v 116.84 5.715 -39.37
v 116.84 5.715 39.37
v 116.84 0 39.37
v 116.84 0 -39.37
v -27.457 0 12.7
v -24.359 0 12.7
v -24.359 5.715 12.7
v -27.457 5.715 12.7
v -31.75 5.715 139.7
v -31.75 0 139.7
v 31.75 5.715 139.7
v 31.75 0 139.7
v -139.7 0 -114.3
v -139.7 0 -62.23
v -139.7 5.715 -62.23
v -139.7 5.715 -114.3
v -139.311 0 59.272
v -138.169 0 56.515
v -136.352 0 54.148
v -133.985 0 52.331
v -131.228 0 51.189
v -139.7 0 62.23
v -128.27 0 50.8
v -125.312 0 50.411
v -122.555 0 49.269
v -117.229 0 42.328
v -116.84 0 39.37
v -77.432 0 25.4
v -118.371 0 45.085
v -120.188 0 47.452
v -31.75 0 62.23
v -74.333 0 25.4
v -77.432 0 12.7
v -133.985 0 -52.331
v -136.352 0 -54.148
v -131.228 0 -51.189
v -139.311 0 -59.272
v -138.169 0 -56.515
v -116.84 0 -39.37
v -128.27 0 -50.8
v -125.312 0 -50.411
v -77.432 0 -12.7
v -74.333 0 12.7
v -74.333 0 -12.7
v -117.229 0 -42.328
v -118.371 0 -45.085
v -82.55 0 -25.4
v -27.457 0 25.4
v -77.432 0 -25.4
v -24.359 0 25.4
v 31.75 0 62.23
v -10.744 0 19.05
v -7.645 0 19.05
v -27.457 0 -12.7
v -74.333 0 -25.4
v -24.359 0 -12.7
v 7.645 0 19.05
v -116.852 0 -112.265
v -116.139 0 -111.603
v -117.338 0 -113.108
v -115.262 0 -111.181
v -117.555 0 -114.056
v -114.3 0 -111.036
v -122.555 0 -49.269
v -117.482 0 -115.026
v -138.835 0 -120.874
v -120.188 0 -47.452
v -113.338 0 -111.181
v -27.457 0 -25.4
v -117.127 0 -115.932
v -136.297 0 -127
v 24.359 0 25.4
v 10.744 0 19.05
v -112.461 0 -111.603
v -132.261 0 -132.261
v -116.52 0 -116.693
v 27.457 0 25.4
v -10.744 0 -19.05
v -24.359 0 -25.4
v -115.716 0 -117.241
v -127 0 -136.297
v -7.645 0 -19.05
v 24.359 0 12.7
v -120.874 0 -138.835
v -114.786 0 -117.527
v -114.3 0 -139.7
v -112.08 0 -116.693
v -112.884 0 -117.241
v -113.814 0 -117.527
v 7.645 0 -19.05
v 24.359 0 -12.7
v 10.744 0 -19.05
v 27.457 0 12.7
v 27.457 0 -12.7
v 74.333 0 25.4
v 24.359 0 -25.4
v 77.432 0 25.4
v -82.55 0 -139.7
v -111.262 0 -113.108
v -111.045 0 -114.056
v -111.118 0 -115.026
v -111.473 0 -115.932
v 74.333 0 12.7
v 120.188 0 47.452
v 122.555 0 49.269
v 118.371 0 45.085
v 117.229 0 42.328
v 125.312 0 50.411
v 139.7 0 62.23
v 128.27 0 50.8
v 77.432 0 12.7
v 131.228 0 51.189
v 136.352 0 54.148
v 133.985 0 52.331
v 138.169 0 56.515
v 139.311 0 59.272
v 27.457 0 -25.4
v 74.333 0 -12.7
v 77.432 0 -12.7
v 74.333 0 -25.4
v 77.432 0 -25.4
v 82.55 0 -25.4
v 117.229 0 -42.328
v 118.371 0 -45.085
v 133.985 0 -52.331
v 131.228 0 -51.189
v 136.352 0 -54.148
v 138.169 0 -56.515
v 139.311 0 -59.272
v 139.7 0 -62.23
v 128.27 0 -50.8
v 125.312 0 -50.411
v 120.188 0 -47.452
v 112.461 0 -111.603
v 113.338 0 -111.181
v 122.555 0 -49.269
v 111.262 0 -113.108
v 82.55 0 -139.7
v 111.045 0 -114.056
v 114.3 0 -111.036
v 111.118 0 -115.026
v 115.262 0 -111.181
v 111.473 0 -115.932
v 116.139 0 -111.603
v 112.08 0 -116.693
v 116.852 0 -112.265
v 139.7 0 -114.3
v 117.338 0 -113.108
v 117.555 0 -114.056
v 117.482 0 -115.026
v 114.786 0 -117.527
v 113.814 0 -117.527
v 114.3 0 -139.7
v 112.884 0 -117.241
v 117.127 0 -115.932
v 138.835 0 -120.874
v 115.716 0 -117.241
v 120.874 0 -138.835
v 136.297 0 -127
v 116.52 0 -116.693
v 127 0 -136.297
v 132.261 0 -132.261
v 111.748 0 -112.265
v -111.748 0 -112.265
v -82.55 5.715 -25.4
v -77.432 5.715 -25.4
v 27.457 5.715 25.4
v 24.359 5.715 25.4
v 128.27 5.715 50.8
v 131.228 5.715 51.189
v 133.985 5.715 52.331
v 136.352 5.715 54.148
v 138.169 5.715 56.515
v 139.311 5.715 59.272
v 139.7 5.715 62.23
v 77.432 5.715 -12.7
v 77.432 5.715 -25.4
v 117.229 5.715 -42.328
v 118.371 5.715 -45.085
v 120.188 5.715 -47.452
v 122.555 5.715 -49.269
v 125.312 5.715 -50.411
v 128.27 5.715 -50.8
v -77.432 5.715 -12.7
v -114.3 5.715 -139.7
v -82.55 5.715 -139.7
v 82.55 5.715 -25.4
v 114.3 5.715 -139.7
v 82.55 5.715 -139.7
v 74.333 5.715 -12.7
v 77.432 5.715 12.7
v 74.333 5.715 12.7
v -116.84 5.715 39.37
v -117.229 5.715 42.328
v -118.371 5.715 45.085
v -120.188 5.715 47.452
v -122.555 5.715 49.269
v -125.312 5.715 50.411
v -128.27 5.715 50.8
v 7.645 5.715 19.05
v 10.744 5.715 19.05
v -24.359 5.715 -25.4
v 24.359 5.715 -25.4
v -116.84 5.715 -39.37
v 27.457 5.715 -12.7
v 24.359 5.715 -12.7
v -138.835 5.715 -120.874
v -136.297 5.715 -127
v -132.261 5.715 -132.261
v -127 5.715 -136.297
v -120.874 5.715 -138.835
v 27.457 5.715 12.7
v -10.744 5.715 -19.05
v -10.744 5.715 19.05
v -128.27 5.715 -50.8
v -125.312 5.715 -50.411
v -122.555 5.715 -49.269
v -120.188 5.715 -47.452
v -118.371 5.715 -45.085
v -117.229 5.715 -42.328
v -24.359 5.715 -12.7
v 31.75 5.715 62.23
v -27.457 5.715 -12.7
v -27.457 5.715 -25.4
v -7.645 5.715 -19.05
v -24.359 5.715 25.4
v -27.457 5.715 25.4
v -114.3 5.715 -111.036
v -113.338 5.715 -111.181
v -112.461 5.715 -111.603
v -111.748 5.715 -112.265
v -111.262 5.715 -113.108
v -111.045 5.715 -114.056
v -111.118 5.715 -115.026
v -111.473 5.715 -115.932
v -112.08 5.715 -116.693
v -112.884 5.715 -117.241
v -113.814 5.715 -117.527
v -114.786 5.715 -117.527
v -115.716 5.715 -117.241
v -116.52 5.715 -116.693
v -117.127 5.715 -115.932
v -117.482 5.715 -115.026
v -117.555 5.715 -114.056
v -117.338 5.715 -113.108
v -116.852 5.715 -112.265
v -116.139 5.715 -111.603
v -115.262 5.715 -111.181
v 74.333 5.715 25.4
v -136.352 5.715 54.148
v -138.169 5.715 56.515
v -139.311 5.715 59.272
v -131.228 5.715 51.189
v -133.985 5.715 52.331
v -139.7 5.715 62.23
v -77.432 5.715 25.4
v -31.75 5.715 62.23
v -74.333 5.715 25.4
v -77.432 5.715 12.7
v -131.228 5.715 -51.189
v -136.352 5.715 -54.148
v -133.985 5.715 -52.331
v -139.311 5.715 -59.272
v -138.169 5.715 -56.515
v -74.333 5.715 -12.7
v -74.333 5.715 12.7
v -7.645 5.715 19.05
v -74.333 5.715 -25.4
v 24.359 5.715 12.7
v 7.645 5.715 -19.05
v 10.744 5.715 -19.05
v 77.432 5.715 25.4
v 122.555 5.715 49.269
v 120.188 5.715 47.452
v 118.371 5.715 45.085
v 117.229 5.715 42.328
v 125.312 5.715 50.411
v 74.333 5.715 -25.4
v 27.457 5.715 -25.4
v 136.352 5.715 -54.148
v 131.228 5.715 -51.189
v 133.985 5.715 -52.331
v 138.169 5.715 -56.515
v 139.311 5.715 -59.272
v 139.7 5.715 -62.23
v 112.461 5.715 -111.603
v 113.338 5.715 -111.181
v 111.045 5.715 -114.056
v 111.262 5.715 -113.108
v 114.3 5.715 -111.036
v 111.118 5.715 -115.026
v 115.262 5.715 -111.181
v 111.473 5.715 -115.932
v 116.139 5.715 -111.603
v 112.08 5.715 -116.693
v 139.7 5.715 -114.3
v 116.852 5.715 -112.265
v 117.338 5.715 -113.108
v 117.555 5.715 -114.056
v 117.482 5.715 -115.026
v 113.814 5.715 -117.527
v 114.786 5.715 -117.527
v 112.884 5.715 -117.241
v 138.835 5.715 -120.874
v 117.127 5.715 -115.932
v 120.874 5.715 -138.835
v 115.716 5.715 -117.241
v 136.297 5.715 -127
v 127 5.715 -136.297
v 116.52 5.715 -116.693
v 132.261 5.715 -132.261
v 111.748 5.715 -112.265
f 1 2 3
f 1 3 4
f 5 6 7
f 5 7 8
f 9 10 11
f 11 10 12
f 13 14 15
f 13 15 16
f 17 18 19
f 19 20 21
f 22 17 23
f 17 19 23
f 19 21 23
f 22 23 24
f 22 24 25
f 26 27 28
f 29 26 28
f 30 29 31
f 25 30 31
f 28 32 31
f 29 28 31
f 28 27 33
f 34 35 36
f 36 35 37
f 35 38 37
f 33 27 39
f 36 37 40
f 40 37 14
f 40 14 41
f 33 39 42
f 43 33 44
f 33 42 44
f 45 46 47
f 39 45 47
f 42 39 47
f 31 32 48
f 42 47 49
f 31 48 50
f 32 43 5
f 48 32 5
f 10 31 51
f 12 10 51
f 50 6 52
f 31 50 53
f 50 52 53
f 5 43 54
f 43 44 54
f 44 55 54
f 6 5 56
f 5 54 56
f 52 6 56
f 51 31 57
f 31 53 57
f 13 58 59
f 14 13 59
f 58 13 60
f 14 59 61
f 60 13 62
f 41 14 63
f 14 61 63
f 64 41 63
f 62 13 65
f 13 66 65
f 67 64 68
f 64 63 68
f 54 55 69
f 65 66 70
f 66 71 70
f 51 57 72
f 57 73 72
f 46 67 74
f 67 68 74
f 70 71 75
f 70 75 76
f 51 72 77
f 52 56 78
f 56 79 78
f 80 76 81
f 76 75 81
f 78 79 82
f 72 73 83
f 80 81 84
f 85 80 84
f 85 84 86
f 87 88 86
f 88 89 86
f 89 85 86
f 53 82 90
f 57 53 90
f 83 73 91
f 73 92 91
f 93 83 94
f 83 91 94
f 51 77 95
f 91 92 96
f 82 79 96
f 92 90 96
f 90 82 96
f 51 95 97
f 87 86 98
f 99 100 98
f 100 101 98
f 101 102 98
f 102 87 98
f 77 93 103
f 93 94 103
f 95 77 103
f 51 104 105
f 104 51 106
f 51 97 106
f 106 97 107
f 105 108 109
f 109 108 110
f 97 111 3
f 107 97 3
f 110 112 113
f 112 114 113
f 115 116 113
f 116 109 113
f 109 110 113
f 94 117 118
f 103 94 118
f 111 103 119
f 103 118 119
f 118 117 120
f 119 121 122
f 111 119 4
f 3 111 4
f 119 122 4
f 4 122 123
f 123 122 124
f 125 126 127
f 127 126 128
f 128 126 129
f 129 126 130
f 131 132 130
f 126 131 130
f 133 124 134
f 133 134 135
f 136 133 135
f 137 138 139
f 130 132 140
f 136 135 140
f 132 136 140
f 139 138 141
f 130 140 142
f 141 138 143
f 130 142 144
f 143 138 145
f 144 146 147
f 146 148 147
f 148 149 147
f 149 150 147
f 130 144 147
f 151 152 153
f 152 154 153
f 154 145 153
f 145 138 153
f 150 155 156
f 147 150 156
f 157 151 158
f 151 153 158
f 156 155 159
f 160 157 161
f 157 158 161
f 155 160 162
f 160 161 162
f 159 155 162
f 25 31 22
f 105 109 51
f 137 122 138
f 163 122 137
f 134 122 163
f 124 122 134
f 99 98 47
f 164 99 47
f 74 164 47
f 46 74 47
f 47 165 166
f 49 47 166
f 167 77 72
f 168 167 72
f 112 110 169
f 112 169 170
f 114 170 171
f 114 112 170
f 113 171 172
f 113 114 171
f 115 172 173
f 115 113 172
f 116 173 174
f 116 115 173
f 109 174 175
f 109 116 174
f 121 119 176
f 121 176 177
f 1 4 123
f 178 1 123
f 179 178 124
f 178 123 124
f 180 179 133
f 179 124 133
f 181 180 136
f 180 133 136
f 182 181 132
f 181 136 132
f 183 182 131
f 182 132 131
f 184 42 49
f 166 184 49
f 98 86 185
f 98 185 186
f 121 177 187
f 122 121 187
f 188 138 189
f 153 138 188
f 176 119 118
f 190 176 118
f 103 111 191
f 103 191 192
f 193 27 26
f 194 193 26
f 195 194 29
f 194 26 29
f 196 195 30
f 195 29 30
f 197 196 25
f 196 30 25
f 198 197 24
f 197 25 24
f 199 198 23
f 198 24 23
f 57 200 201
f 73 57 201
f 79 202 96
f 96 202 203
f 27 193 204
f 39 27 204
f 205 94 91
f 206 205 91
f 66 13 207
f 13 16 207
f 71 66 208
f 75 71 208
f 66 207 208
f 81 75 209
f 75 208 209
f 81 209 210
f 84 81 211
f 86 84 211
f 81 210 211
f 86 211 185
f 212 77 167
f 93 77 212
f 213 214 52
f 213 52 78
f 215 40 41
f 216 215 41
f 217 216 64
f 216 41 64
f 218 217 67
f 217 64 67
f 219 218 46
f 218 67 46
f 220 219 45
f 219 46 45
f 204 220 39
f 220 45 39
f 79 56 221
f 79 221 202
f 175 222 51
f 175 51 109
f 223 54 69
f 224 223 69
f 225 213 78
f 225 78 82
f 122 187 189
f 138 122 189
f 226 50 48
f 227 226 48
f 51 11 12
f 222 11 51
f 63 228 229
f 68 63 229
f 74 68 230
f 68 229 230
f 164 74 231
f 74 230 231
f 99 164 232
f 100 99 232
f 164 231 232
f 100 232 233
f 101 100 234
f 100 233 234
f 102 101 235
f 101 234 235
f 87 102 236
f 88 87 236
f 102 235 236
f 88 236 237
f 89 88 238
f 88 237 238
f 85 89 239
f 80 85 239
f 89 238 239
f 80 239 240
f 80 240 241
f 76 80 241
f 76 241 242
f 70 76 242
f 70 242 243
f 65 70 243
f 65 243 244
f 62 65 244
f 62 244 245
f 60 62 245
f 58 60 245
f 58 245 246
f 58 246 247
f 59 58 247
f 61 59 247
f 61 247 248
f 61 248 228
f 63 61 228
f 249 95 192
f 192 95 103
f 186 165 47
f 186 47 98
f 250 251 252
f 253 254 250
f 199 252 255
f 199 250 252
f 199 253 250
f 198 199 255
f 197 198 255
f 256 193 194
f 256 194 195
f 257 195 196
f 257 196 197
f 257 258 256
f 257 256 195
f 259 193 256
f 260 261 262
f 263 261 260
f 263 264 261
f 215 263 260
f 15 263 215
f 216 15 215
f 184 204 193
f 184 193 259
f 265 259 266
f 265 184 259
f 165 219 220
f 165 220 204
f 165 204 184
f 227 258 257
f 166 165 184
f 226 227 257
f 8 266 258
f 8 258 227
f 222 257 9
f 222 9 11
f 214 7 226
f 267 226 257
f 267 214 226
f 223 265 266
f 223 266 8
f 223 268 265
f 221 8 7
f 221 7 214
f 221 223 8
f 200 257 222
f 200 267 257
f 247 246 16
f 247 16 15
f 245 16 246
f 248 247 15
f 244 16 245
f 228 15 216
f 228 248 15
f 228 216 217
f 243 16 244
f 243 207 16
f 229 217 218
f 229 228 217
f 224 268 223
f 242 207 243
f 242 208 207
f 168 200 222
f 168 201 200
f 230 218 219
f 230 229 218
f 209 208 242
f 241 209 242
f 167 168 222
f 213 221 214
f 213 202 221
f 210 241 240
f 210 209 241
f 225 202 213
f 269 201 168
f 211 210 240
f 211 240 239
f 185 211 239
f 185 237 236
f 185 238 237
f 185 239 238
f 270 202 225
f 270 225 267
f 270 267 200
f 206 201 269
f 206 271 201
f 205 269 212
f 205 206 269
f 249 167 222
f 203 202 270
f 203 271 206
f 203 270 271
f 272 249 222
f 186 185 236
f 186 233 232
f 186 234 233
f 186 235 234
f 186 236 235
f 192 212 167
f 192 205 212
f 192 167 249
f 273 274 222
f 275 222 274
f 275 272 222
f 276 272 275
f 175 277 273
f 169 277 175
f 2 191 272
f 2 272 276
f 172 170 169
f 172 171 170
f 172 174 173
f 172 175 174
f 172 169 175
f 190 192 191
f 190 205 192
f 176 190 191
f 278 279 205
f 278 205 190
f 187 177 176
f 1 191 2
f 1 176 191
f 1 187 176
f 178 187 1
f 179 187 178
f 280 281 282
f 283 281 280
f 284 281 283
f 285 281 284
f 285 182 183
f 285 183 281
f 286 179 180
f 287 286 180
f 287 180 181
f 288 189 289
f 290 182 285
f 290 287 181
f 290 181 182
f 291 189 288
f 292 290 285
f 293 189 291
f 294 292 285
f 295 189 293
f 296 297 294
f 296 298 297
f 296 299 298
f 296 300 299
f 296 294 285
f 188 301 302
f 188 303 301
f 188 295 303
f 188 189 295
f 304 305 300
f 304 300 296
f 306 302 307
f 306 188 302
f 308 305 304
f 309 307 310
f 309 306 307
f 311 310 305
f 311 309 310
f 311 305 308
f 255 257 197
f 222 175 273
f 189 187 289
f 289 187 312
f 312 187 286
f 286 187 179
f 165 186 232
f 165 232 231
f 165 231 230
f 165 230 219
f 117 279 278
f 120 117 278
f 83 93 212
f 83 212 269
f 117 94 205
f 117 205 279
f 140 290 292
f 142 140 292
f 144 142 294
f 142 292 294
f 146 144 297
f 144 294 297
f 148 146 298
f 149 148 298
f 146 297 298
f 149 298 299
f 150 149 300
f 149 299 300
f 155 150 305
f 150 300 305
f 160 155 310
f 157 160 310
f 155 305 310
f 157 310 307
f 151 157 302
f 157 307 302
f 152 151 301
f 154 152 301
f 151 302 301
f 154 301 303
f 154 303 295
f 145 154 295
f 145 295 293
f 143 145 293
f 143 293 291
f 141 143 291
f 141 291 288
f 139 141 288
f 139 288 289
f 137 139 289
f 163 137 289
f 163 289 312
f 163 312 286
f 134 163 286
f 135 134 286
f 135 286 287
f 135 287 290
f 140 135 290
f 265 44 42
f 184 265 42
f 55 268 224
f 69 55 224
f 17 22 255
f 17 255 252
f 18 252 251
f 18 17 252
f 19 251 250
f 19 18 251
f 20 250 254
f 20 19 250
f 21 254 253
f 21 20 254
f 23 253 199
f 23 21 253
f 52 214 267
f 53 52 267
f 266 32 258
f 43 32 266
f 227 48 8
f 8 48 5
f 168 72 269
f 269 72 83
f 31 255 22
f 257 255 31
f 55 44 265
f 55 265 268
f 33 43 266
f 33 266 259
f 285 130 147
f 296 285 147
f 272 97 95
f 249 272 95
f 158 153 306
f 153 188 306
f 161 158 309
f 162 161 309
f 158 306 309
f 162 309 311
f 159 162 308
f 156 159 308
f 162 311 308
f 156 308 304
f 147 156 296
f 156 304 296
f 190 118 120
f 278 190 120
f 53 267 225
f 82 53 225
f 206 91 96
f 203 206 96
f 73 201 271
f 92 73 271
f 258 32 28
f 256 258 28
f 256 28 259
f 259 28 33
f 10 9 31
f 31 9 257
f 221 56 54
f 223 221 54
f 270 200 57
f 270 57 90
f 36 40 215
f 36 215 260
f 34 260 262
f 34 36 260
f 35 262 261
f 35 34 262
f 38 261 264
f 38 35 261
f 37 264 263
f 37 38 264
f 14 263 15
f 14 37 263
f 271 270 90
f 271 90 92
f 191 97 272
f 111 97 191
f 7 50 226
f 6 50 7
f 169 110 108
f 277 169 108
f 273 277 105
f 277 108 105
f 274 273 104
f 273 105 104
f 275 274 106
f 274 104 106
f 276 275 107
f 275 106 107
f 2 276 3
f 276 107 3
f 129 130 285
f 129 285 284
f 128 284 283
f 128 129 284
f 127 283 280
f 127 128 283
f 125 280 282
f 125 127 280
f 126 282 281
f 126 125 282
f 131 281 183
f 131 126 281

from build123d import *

# Parameters (mm, degrees)
SKETCH1_W           = 279.4
SKETCH1_H           = 279.4
BOSS_EXTRUDE1_DEPTH = 5.715
CUT_EXTRUDE2_REACH  = 199.648
SKETCH4_W           = 22.86
SKETCH4_H           = 101.6
FILLET1_START       = -1
FILLET1_DEPTH       = 8
FILLET1_2_DEPTH     = 5.715
CUT_EXTRUDE3_REACH  = 199.648
SKETCH5_W           = 3.0988
SKETCH5_H           = 12.7
CUT_EXTRUDE4_REACH  = 199.648
SKETCH6_R           = 3.2639
FILLET2_R           = 25.4
CUT_EXTRUDE5_REACH  = 199.648
SKETCH7_W           = 165.1
SKETCH7_H           = 114.3
CUT_EXTRUDE7_REACH  = 199.648
SKETCH16_W          = 3.0988
SKETCH16_H          = 38.1
CUT_EXTRUDE11_REACH = 199.648
SKETCH26_W          = 107.95
SKETCH26_H          = 77.47


with BuildPart() as part:
    # Sketch1 → Boss-Extrude1 (new body)
    with BuildSketch(Plane(origin=(0, 0, 0), x_dir=(1, 0, 0), z_dir=(0, 1, 0))):
        Rectangle(SKETCH1_W, SKETCH1_H)
    extrude(amount=BOSS_EXTRUDE1_DEPTH)

    # Sketch4 → Cut-Extrude2 (cut, up to next)
    with BuildSketch(Plane(origin=(0, 5.715, 0), x_dir=(1, 0, 0), z_dir=(0, 1, 0)), mode=Mode.PRIVATE) as cut_extrude2_sk1:
        with Locations((-128.27, 0)):
            Rectangle(SKETCH4_W, SKETCH4_H)
    cut_extrude2_tool1 = extrude(cut_extrude2_sk1.sketch, amount=-CUT_EXTRUDE2_REACH, mode=Mode.PRIVATE) & part.part
    # Sketch4 → Cut-Extrude2 (cut, up to next)
    with BuildSketch(Plane(origin=(0, 5.715, 0), x_dir=(1, 0, 0), z_dir=(0, 1, 0)), mode=Mode.PRIVATE) as cut_extrude2_sk2:
        with Locations((128.27, 0)):
            Rectangle(SKETCH4_W, SKETCH4_H)
    cut_extrude2_tool2 = extrude(cut_extrude2_sk2.sketch, amount=-CUT_EXTRUDE2_REACH, mode=Mode.PRIVATE) & part.part
    add(cut_extrude2_tool1.solids().sort_by_distance((-128.27, 5.715, 0))[0], mode=Mode.SUBTRACT)
    add(cut_extrude2_tool2.solids().sort_by_distance((128.27, 5.715, 0))[0], mode=Mode.SUBTRACT)

    # Fillet1: read off the stored shape, not the designer's step
    # Fillet1 outline → Fillet1 (cut)
    with BuildSketch(Plane(origin=(0, 0, 0), x_dir=(1, 0, 0), z_dir=(0, 1, 0)).offset(FILLET1_START)):
        with BuildLine():
            ThreePointArc((-139.7, -62.23), (-136.352230509, -54.147769491), (-128.27, -50.8))
            Line((-128.27, -50.8), (-139.7, -50.8))
            Line((-139.7, -50.8), (-139.7, -62.23))
        make_face()
        with BuildLine():
            ThreePointArc((-128.27, 50.8), (-136.352230509, 54.147769491), (-139.7, 62.23))
            Line((-139.7, 62.23), (-139.7, 50.8))
            Line((-139.7, 50.8), (-128.27, 50.8))
        make_face()
        with BuildLine():
            Line((139.7, -50.8), (128.27, -50.8))
            ThreePointArc((128.27, -50.8), (136.352230509, -54.147769491), (139.7, -62.23))
            Line((139.7, -62.23), (139.7, -50.8))
        make_face()
        with BuildLine():
            ThreePointArc((139.7, 62.23), (136.352230509, 54.147769491), (128.27, 50.8))
            Line((128.27, 50.8), (139.7, 50.8))
            Line((139.7, 50.8), (139.7, 62.23))
        make_face()
    extrude(amount=FILLET1_DEPTH, mode=Mode.SUBTRACT)

    # Fillet1 2 outline → Fillet1 2 (add)
    with BuildSketch(Plane(origin=(0, 0, 0), x_dir=(1, 0, 0), z_dir=(0, 1, 0))):
        with BuildLine():
            Line((-116.84, -50.8), (-116.84, -39.37))
            ThreePointArc((-116.84, -39.37), (-120.187769491, -47.452230509), (-128.27, -50.8))
            Line((-128.27, -50.8), (-116.84, -50.8))
        make_face()
        with BuildLine():
            Line((-116.84, 50.8), (-128.27, 50.8))
            ThreePointArc((-128.27, 50.8), (-120.187769491, 47.452230509), (-116.84, 39.37))
            Line((-116.84, 39.37), (-116.84, 50.8))
        make_face()
        with BuildLine():
            Line((116.84, -50.8), (128.27, -50.8))
            ThreePointArc((128.27, -50.8), (120.187769491, -47.452230509), (116.84, -39.37))
            Line((116.84, -39.37), (116.84, -50.8))
        make_face()
        with BuildLine():
            Line((116.84, 50.8), (116.84, 39.37))
            ThreePointArc((116.84, 39.37), (120.187769491, 47.452230509), (128.27, 50.8))
            Line((128.27, 50.8), (116.84, 50.8))
        make_face()
    extrude(amount=FILLET1_2_DEPTH)

    # Sketch5 → Cut-Extrude3 (cut, up to next)
    with BuildSketch(Plane(origin=(0, 0, 0), x_dir=(-1, 0, 0), z_dir=(0, -1, 0)), mode=Mode.PRIVATE) as cut_extrude3_sk1:
        with Locations((75.8825, -19.05)):
            Rectangle(SKETCH5_W, SKETCH5_H)
    cut_extrude3_tool1 = extrude(cut_extrude3_sk1.sketch, amount=-CUT_EXTRUDE3_REACH, mode=Mode.PRIVATE) & part.part
    # Sketch5 → Cut-Extrude3 (cut, up to next)
    with BuildSketch(Plane(origin=(0, 0, 0), x_dir=(-1, 0, 0), z_dir=(0, -1, 0)), mode=Mode.PRIVATE) as cut_extrude3_sk2:
        with Locations((75.8825, 19.05)):
            Rectangle(SKETCH5_W, SKETCH5_H)
    cut_extrude3_tool2 = extrude(cut_extrude3_sk2.sketch, amount=-CUT_EXTRUDE3_REACH, mode=Mode.PRIVATE) & part.part
    # Sketch5 → Cut-Extrude3 (cut, up to next)
    with BuildSketch(Plane(origin=(0, 0, 0), x_dir=(-1, 0, 0), z_dir=(0, -1, 0)), mode=Mode.PRIVATE) as cut_extrude3_sk3:
        with Locations((-75.8825, 19.05)):
            Rectangle(SKETCH5_W, SKETCH5_H)
    cut_extrude3_tool3 = extrude(cut_extrude3_sk3.sketch, amount=-CUT_EXTRUDE3_REACH, mode=Mode.PRIVATE) & part.part
    # Sketch5 → Cut-Extrude3 (cut, up to next)
    with BuildSketch(Plane(origin=(0, 0, 0), x_dir=(-1, 0, 0), z_dir=(0, -1, 0)), mode=Mode.PRIVATE) as cut_extrude3_sk4:
        with Locations((-75.8825, -19.05)):
            Rectangle(SKETCH5_W, SKETCH5_H)
    cut_extrude3_tool4 = extrude(cut_extrude3_sk4.sketch, amount=-CUT_EXTRUDE3_REACH, mode=Mode.PRIVATE) & part.part
    # Sketch5 → Cut-Extrude3 (cut, up to next)
    with BuildSketch(Plane(origin=(0, 0, 0), x_dir=(-1, 0, 0), z_dir=(0, -1, 0)), mode=Mode.PRIVATE) as cut_extrude3_sk5:
        with Locations((25.908, -19.05)):
            Rectangle(SKETCH5_W, SKETCH5_H)
    cut_extrude3_tool5 = extrude(cut_extrude3_sk5.sketch, amount=-CUT_EXTRUDE3_REACH, mode=Mode.PRIVATE) & part.part
    # Sketch5 → Cut-Extrude3 (cut, up to next)
    with BuildSketch(Plane(origin=(0, 0, 0), x_dir=(-1, 0, 0), z_dir=(0, -1, 0)), mode=Mode.PRIVATE) as cut_extrude3_sk6:
        with Locations((25.908, 19.05)):
            Rectangle(SKETCH5_W, SKETCH5_H)
    cut_extrude3_tool6 = extrude(cut_extrude3_sk6.sketch, amount=-CUT_EXTRUDE3_REACH, mode=Mode.PRIVATE) & part.part
    # Sketch5 → Cut-Extrude3 (cut, up to next)
    with BuildSketch(Plane(origin=(0, 0, 0), x_dir=(-1, 0, 0), z_dir=(0, -1, 0)), mode=Mode.PRIVATE) as cut_extrude3_sk7:
        with Locations((-25.908, 19.05)):
            Rectangle(SKETCH5_W, SKETCH5_H)
    cut_extrude3_tool7 = extrude(cut_extrude3_sk7.sketch, amount=-CUT_EXTRUDE3_REACH, mode=Mode.PRIVATE) & part.part
    # Sketch5 → Cut-Extrude3 (cut, up to next)
    with BuildSketch(Plane(origin=(0, 0, 0), x_dir=(-1, 0, 0), z_dir=(0, -1, 0)), mode=Mode.PRIVATE) as cut_extrude3_sk8:
        with Locations((-25.908, -19.05)):
            Rectangle(SKETCH5_W, SKETCH5_H)
    cut_extrude3_tool8 = extrude(cut_extrude3_sk8.sketch, amount=-CUT_EXTRUDE3_REACH, mode=Mode.PRIVATE) & part.part
    add(cut_extrude3_tool1.solids().sort_by_distance((-75.8825, 0, 19.05))[0], mode=Mode.SUBTRACT)
    add(cut_extrude3_tool2.solids().sort_by_distance((-75.8825, 0, -19.05))[0], mode=Mode.SUBTRACT)
    add(cut_extrude3_tool3.solids().sort_by_distance((75.8825, 0, -19.05))[0], mode=Mode.SUBTRACT)
    add(cut_extrude3_tool4.solids().sort_by_distance((75.8825, 0, 19.05))[0], mode=Mode.SUBTRACT)
    add(cut_extrude3_tool5.solids().sort_by_distance((-25.908, 0, 19.05))[0], mode=Mode.SUBTRACT)
    add(cut_extrude3_tool6.solids().sort_by_distance((-25.908, 0, -19.05))[0], mode=Mode.SUBTRACT)
    add(cut_extrude3_tool7.solids().sort_by_distance((25.908, 0, -19.05))[0], mode=Mode.SUBTRACT)
    add(cut_extrude3_tool8.solids().sort_by_distance((25.908, 0, 19.05))[0], mode=Mode.SUBTRACT)

    # Sketch6 → Cut-Extrude4 (cut, up to next)
    with BuildSketch(Plane(origin=(0, 5.715, 0), x_dir=(1, 0, 0), z_dir=(0, 1, 0)), mode=Mode.PRIVATE) as cut_extrude4_sk1:
        with Locations(Location((-114.3, 114.3, 0), (0, 0, 270))):
            Circle(SKETCH6_R)
    cut_extrude4_tool1 = extrude(cut_extrude4_sk1.sketch, amount=-CUT_EXTRUDE4_REACH, mode=Mode.PRIVATE) & part.part
    # Sketch6 → Cut-Extrude4 (cut, up to next)
    with BuildSketch(Plane(origin=(0, 5.715, 0), x_dir=(1, 0, 0), z_dir=(0, 1, 0)), mode=Mode.PRIVATE) as cut_extrude4_sk2:
        with Locations(Location((114.3, 114.3, 0), (0, 0, 270))):
            Circle(SKETCH6_R)
    cut_extrude4_tool2 = extrude(cut_extrude4_sk2.sketch, amount=-CUT_EXTRUDE4_REACH, mode=Mode.PRIVATE) & part.part
    # Sketch6 → Cut-Extrude4 (cut, up to next)
    with BuildSketch(Plane(origin=(0, 5.715, 0), x_dir=(1, 0, 0), z_dir=(0, 1, 0)), mode=Mode.PRIVATE) as cut_extrude4_sk3:
        with Locations(Location((114.3, -114.3, 0), (0, 0, 270))):
            Circle(SKETCH6_R)
    cut_extrude4_tool3 = extrude(cut_extrude4_sk3.sketch, amount=-CUT_EXTRUDE4_REACH, mode=Mode.PRIVATE) & part.part
    # Sketch6 → Cut-Extrude4 (cut, up to next)
    with BuildSketch(Plane(origin=(0, 5.715, 0), x_dir=(1, 0, 0), z_dir=(0, 1, 0)), mode=Mode.PRIVATE) as cut_extrude4_sk4:
        with Locations(Location((-114.3, -114.3, 0), (0, 0, 270))):
            Circle(SKETCH6_R)
    cut_extrude4_tool4 = extrude(cut_extrude4_sk4.sketch, amount=-CUT_EXTRUDE4_REACH, mode=Mode.PRIVATE) & part.part
    add(cut_extrude4_tool1.solids().sort_by_distance((-114.3, 5.715, -114.3))[0], mode=Mode.SUBTRACT)
    add(cut_extrude4_tool2.solids().sort_by_distance((114.3, 5.715, -114.3))[0], mode=Mode.SUBTRACT)
    add(cut_extrude4_tool3.solids().sort_by_distance((114.3, 5.715, 114.3))[0], mode=Mode.SUBTRACT)
    add(cut_extrude4_tool4.solids().sort_by_distance((-114.3, 5.715, 114.3))[0], mode=Mode.SUBTRACT)

    # Fillet2
    fillet2_edges = [part.edges().sort_by_distance(p)[0] for p in [
        (-139.7, 2.8575, -139.7),
        (139.7, 2.8575, -139.7),
        (139.7, 2.8575, 139.7),
        (-139.7, 2.8575, 139.7),
    ]]
    fillet(fillet2_edges, radius=FILLET2_R)

    # Sketch7 → Cut-Extrude5 (cut, up to next)
    with BuildSketch(Plane(origin=(0, 5.715, 0), x_dir=(1, 0, 0), z_dir=(0, 1, 0)), mode=Mode.PRIVATE) as cut_extrude5_sk1:
        with Locations((0, 82.55)):
            Rectangle(SKETCH7_W, SKETCH7_H)
    cut_extrude5_tool1 = extrude(cut_extrude5_sk1.sketch, amount=-CUT_EXTRUDE5_REACH, mode=Mode.PRIVATE) & part.part
    add(cut_extrude5_tool1.solids().sort_by_distance((0, 5.715, -82.55))[0], mode=Mode.SUBTRACT)

    # Sketch16 → Cut-Extrude7 (cut, up to next)
    with BuildSketch(Plane(origin=(0, 5.715, 0), x_dir=(1, 0, 0), z_dir=(0, 1, 0)), mode=Mode.PRIVATE) as cut_extrude7_sk1:
        with Locations((-9.1948, 0)):
            Rectangle(SKETCH16_W, SKETCH16_H)
    cut_extrude7_tool1 = extrude(cut_extrude7_sk1.sketch, amount=-CUT_EXTRUDE7_REACH, mode=Mode.PRIVATE) & part.part
    # Sketch16 → Cut-Extrude7 (cut, up to next)
    with BuildSketch(Plane(origin=(0, 5.715, 0), x_dir=(1, 0, 0), z_dir=(0, 1, 0)), mode=Mode.PRIVATE) as cut_extrude7_sk2:
        with Locations((9.1948, 0)):
            Rectangle(SKETCH16_W, SKETCH16_H)
    cut_extrude7_tool2 = extrude(cut_extrude7_sk2.sketch, amount=-CUT_EXTRUDE7_REACH, mode=Mode.PRIVATE) & part.part
    add(cut_extrude7_tool1.solids().sort_by_distance((-9.1948, 5.715, 0))[0], mode=Mode.SUBTRACT)
    add(cut_extrude7_tool2.solids().sort_by_distance((9.1948, 5.715, 0))[0], mode=Mode.SUBTRACT)

    # Sketch26 → Cut-Extrude11 (cut, up to next)
    with BuildSketch(Plane(origin=(0, 5.715, 0), x_dir=(1, 0, 0), z_dir=(0, 1, 0)), mode=Mode.PRIVATE) as cut_extrude11_sk1:
        with Locations((-85.725, -100.965)):
            Rectangle(SKETCH26_W, SKETCH26_H)
    cut_extrude11_tool1 = extrude(cut_extrude11_sk1.sketch, amount=-CUT_EXTRUDE11_REACH, mode=Mode.PRIVATE) & part.part
    # Sketch26 → Cut-Extrude11 (cut, up to next)
    with BuildSketch(Plane(origin=(0, 5.715, 0), x_dir=(1, 0, 0), z_dir=(0, 1, 0)), mode=Mode.PRIVATE) as cut_extrude11_sk2:
        with Locations((85.725, -100.965)):
            Rectangle(SKETCH26_W, SKETCH26_H)
    cut_extrude11_tool2 = extrude(cut_extrude11_sk2.sketch, amount=-CUT_EXTRUDE11_REACH, mode=Mode.PRIVATE) & part.part
    add(cut_extrude11_tool1.solids().sort_by_distance((-85.725, 5.715, 100.965))[0], mode=Mode.SUBTRACT)
    add(cut_extrude11_tool2.solids().sort_by_distance((85.725, 5.715, 100.965))[0], mode=Mode.SUBTRACT)


solid = part.part
